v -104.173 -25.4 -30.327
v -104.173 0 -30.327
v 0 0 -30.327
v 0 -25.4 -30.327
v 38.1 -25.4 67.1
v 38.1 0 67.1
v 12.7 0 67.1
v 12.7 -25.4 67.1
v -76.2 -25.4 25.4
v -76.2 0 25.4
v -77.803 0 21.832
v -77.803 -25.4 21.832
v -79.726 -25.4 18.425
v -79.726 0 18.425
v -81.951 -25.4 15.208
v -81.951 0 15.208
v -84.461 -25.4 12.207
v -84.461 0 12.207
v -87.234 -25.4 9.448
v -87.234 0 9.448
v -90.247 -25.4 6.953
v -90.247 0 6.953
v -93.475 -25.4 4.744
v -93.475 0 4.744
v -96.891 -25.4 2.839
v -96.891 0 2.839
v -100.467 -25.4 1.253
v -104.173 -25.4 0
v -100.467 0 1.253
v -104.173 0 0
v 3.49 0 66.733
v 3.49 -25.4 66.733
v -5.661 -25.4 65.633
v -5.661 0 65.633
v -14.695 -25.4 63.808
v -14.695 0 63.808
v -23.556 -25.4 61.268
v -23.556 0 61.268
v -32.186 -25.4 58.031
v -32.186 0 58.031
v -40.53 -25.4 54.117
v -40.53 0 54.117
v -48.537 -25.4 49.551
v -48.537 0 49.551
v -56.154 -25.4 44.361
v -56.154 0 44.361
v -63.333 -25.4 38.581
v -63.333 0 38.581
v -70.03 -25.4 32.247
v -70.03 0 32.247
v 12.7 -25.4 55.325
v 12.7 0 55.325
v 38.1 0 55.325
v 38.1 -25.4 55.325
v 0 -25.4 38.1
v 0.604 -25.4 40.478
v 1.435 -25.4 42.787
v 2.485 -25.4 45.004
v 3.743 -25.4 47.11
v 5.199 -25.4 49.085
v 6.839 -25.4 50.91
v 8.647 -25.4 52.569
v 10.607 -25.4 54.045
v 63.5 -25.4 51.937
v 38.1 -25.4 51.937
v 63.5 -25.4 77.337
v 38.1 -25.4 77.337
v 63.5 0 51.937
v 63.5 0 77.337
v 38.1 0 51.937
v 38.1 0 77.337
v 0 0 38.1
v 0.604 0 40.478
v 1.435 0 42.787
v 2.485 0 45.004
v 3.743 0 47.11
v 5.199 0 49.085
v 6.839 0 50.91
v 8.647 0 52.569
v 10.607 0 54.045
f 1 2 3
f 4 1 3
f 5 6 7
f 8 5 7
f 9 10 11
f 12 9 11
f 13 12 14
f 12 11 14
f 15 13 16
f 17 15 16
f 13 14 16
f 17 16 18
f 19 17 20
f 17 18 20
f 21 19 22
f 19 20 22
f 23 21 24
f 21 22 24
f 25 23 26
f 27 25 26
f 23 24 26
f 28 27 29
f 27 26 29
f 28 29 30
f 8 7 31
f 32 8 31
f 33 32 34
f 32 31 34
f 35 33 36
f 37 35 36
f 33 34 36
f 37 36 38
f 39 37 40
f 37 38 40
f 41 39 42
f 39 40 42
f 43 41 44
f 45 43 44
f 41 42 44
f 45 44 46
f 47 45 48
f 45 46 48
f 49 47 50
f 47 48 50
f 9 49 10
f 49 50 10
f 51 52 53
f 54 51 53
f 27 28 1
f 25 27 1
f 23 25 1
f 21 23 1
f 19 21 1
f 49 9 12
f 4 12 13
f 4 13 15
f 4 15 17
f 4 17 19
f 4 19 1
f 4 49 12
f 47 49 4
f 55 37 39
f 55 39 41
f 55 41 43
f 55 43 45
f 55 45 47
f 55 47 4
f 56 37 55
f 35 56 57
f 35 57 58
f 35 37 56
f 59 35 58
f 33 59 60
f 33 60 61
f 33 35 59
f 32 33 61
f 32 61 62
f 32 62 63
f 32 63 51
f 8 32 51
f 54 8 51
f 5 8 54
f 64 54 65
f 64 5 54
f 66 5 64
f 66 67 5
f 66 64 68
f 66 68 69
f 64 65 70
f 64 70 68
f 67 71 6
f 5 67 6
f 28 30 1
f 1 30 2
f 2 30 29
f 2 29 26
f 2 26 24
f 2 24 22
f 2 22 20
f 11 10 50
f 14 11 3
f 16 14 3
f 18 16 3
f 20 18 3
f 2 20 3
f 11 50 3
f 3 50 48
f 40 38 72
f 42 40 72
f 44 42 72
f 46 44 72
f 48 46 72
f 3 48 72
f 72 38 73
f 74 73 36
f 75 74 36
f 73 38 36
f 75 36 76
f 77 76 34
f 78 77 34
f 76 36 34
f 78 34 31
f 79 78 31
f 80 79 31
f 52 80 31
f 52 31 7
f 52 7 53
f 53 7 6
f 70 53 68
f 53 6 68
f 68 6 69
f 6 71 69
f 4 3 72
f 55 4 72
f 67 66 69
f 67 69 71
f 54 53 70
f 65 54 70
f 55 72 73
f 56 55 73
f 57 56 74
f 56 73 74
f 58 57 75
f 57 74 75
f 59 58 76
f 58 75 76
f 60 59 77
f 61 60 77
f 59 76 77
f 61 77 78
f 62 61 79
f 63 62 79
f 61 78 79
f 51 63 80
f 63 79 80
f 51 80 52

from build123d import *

# Parameters (mm, degrees)
F1_DEPTH = 25.4


with BuildPart() as f1:
    # F0 (on Front) → F1 (new body)
    with BuildSketch(Plane.XZ):
        Polygon((0, -30.327365), (0, 0), (-76.2, 0), (-104.173273, 0), (-104.173273, -30.327365), align=None)
        Polygon((-76.2, 0), (0, 0), (0, 25.4), (-11.711787, 25.4), (-76.2, 25.4), align=None)
        with BuildLine():
            Line((-104.173273, 0), (-76.2, 0))
            Line((-76.2, 0), (-76.2, 25.4))
            ThreePointArc((-76.2, 25.4), (-87.233659, 9.447856), (-104.173273, 0))
        make_face()
        with BuildLine():
            Line((-11.711787, 25.4), (0, 25.4))
            Line((0, 25.4), (0, 38.1))
            ThreePointArc((0, 38.1), (4.447352, 48.115325), (12.7, 55.325005))
            Line((12.7, 55.325005), (38.1, 55.325005))
            Line((38.1, 55.325005), (38.1, 67.100359))
            Line((38.1, 67.100359), (12.7, 67.100359))
            ThreePointArc((12.7, 67.100359), (-3.36853, 55.851652), (-11.711787, 38.1))
            Line((-11.711787, 38.1), (-11.711787, 25.4))
        make_face()
        with BuildLine():
            ThreePointArc((12.7, 67.100359), (-36.397174, 56.157378), (-76.2, 25.4))
            Line((-76.2, 25.4), (-11.711787, 25.4))
            Line((-11.711787, 25.4), (-11.711787, 38.1))
            ThreePointArc((-11.711787, 38.1), (-3.36853, 55.851652), (12.7, 67.100359))
        make_face()
        Polygon((38.1, 77.336693), (38.1, 67.100359), (38.1, 55.325005), (38.1, 51.936693), (63.5, 51.936693), (63.5, 77.336693), align=None)
    extrude(amount=F1_DEPTH)


solid = f1.part
